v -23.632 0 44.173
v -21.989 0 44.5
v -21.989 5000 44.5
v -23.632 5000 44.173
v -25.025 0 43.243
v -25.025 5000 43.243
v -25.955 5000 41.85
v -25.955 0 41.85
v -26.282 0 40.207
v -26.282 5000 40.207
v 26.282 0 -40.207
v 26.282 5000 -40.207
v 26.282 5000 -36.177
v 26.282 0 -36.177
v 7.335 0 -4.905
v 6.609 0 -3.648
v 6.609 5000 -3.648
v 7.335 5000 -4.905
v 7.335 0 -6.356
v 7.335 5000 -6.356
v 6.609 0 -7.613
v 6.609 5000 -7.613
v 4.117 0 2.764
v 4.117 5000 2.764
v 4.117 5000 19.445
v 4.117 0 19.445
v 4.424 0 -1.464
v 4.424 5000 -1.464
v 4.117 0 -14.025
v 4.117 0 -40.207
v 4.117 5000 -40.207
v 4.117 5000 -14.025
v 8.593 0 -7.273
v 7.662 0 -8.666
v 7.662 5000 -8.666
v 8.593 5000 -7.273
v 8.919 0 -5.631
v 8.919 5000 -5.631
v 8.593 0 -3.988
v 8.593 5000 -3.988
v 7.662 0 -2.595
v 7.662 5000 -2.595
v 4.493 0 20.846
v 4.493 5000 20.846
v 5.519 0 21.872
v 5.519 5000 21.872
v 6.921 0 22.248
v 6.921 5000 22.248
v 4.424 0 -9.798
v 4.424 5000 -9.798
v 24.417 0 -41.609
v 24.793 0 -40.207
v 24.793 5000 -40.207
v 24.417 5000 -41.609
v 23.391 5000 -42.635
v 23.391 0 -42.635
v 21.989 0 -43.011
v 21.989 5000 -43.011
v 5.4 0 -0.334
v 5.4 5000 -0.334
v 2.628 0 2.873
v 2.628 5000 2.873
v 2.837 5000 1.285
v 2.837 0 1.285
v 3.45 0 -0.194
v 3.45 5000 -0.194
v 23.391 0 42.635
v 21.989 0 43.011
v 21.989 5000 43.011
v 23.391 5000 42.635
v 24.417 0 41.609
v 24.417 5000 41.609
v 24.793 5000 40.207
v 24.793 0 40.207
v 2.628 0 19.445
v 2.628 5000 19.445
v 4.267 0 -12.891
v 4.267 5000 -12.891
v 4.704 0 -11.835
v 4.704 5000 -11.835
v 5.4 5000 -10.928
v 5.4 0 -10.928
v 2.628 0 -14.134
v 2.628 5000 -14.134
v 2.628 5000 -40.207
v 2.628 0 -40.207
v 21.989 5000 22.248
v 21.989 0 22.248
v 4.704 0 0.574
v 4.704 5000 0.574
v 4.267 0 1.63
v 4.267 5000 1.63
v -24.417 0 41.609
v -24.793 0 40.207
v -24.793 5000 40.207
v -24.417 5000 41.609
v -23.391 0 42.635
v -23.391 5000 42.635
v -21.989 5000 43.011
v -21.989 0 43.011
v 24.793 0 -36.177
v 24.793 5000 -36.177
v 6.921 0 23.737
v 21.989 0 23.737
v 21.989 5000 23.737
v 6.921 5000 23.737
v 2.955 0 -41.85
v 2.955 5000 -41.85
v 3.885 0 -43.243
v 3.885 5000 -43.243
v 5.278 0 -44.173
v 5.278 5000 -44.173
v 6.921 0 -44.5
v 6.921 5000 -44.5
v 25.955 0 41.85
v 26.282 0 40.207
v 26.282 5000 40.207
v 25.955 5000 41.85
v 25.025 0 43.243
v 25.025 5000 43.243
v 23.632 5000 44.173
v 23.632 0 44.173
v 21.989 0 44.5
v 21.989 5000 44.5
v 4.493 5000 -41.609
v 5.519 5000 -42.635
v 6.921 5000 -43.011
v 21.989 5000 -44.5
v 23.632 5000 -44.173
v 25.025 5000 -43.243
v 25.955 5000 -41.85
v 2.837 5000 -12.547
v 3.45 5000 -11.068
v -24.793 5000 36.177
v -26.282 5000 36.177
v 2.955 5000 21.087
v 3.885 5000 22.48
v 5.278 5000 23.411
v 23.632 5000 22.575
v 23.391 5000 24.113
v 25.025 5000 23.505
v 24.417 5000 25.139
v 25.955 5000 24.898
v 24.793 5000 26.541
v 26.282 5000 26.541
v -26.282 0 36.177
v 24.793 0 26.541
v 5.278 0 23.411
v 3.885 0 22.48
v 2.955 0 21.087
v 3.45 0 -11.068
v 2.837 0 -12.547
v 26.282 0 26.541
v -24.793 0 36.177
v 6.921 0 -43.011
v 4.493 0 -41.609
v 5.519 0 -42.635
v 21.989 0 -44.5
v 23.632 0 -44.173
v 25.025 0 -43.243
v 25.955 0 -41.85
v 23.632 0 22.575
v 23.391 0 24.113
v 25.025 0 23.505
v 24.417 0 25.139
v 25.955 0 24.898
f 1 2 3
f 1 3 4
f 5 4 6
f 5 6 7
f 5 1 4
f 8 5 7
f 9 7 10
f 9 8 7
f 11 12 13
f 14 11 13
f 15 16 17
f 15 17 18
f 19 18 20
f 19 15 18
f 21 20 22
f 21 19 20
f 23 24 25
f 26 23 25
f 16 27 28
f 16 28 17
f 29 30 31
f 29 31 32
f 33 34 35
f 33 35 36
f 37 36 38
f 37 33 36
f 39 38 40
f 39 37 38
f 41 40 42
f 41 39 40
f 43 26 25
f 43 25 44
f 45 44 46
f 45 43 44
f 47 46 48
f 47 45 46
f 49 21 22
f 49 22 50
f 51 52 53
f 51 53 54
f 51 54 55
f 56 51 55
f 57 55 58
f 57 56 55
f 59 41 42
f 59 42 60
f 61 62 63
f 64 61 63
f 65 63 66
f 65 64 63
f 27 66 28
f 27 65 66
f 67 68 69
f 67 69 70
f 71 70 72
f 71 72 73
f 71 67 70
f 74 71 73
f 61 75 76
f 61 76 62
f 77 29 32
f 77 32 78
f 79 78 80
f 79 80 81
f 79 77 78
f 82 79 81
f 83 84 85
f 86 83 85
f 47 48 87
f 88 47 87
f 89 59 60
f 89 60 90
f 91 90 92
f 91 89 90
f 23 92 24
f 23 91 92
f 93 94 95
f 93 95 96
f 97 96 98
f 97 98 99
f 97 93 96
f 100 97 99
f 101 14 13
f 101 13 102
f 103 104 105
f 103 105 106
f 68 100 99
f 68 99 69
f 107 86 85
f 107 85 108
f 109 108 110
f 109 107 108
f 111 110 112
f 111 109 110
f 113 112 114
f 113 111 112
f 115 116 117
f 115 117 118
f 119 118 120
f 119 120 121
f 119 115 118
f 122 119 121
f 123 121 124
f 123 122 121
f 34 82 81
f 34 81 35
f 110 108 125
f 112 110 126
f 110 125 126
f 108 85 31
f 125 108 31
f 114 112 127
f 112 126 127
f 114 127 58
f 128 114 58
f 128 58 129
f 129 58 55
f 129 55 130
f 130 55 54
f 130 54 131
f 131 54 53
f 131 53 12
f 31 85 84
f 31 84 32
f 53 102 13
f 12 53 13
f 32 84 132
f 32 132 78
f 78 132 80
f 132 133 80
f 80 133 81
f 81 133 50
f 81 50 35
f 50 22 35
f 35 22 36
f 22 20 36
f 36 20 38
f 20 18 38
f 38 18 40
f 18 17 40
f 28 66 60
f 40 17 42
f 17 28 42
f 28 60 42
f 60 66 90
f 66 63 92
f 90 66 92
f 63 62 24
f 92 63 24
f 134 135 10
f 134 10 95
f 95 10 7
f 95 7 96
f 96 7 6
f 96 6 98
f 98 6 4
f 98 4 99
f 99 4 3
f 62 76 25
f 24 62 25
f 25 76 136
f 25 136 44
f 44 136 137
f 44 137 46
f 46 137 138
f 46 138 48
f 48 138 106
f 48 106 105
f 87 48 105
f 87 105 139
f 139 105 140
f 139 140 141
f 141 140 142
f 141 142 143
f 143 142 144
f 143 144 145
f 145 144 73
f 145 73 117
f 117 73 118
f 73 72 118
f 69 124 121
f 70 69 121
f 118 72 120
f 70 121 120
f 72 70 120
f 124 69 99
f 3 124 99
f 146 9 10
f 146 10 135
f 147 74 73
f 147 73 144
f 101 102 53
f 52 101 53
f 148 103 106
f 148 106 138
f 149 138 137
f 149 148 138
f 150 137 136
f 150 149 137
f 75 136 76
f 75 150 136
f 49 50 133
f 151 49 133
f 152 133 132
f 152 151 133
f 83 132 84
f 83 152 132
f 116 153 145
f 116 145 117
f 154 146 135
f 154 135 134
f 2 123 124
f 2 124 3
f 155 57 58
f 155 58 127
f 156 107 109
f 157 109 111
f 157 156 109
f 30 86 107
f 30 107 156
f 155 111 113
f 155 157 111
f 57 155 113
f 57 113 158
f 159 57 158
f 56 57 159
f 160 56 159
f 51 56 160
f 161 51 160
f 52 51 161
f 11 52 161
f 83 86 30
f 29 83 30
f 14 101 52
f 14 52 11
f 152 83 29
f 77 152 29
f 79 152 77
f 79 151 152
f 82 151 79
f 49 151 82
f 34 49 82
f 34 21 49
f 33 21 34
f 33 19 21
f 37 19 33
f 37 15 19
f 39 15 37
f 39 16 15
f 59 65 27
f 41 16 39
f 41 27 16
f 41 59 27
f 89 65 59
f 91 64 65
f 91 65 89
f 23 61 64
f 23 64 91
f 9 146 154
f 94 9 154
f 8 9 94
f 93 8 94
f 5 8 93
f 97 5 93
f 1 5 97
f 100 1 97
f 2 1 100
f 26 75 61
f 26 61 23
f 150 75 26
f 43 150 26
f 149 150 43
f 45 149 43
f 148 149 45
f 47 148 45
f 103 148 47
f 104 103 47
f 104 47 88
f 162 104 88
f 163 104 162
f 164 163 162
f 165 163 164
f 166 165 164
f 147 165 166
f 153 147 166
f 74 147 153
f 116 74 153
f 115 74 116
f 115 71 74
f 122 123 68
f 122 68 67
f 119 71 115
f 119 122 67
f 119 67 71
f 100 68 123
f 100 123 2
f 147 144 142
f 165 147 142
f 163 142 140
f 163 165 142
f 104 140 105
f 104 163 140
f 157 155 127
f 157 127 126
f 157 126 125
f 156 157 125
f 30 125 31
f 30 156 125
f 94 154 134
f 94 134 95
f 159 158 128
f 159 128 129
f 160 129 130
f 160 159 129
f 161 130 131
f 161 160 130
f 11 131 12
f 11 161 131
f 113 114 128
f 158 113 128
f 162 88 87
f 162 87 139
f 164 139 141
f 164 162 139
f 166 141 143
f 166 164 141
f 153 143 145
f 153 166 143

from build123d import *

# Parameters (mm, degrees)
F1_DEPTH = 5000


# Not quite as in the source:
# - ends of sketch curves that miss each other by under 0.0002 mm in the source are joined


with BuildPart() as f1:
    # F0 (on Front) → F1 (new body)
    with BuildSketch(Plane.XZ):
        with BuildLine():
            Line((26.2818114252, -40.2073050281), (26.2818114252, -36.177426882))
            Line((26.2818114252, -36.177426882), (24.7925087778, -36.177426882))
            Line((24.7925087778, -36.177426882), (24.7925087778, -40.2073046339))
            ThreePointArc((24.7925087778, -40.2073046339), (23.9714139143, -42.1896029892), (21.9891155591, -43.0106978526))
            Line((21.9891155591, -43.0106978526), (6.9208770086, -43.0106978526))
            ThreePointArc((6.9208770086, -43.0106978526), (4.9385786534, -42.1896029892), (4.1174837899, -40.2073046339))
            Line((4.1174837899, -40.2073046339), (4.1174837899, -30.6058300818))
            Line((4.1174837899, -30.6058300818), (4.1174837899, -14.0251837989))
            ThreePointArc((4.1174837899, -14.0251837989), (4.4509143771, -12.3489149315), (5.4004443607, -10.9278427721))
            Line((5.4004443607, -10.9278427721), (7.6621440673, -8.6661430321))
            ThreePointArc((7.6621440673, -8.6661430321), (8.9194384176, -5.6307558244), (7.662136908, -2.5953614834))
            Line((7.662136908, -2.5953614834), (5.4004444754, -0.3336690558))
            ThreePointArc((5.4004444754, -0.3336690558), (4.4509144127, 1.0874031659), (4.1174837899, 2.7636721191))
            Line((4.1174837899, 2.7636721191), (4.1174837899, 19.444672608))
            ThreePointArc((4.1174837899, 19.444672608), (4.9385786534, 21.4269709633), (6.9208770086, 22.2480658267))
            Line((6.9208770086, 22.2480658267), (21.9891155591, 22.2480658267))
            ThreePointArc((21.9891155591, 22.2480658267), (25.0245099156, 23.5053673363), (26.2818114252, 26.5407616928))
            Line((26.2818114252, 26.5407616928), (26.2818114252, 40.2073036339))
            ThreePointArc((26.2818114252, 40.2073036339), (25.0245099156, 43.2426979904), (21.9891155591, 44.4999995))
            Line((21.9891155591, 44.4999995), (-21.9891155591, 44.4999995))
            ThreePointArc((-21.9891155591, 44.4999995), (-25.0245099156, 43.2426979904), (-26.2818114252, 40.2073036339))
            Line((-26.2818114252, 40.2073036339), (-26.2818114252, 36.177425882))
            Line((-26.2818114252, 36.177425882), (-24.7925087778, 36.177425882))
            Line((-24.7925087778, 36.177425882), (-24.7925087778, 40.2073036339))
            ThreePointArc((-24.7925087778, 40.2073036339), (-23.9714139143, 42.1896019892), (-21.9891155591, 43.0106968526))
            Line((-21.9891155591, 43.0106968526), (21.9891155591, 43.0106968526))
            ThreePointArc((21.9891155591, 43.0106968526), (23.9714139143, 42.1896019892), (24.7925087778, 40.2073036339))
            Line((24.7925087778, 40.2073036339), (24.7925087778, 26.5407616928))
            ThreePointArc((24.7925087778, 26.5407616928), (23.9714139143, 24.5584633375), (21.9891155591, 23.7373684741))
            Line((21.9891155591, 23.7373684741), (6.9208770086, 23.7373684741))
            ThreePointArc((6.9208770086, 23.7373684741), (3.8854826521, 22.4800669645), (2.6281811425, 19.444672608))
            Line((2.6281811425, 19.444672608), (2.6281811425, 2.8725354557))
            ThreePointArc((2.6281811425, 2.8725354557), (3.0949839305, 0.525758642), (4.4243261563, -1.4637426783))
            Line((4.4243261563, -1.4637426783), (6.6090409069, -3.6484574844))
            ThreePointArc((6.6090409069, -3.6484574844), (7.4301357701, -5.6307558399), (6.6090409067, -7.6130541952))
            Line((6.6090409067, -7.6130541952), (4.4243263037, -9.7977687547))
            ThreePointArc((4.4243263037, -9.7977687547), (3.0949840701, -11.7872699409), (2.6281811425, -14.1340466099))
            Line((2.6281811425, -14.1340466099), (2.6281811425, -30.4969672709))
            Line((2.6281811425, -30.4969672709), (2.6281811425, -40.2073046339))
            ThreePointArc((2.6281811425, -40.2073046339), (3.8854826521, -43.2426989904), (6.9208770086, -44.5000005))
            Line((6.9208770086, -44.5000005), (21.9891155591, -44.5000005))
            ThreePointArc((21.9891155591, -44.5000005), (25.0245099156, -43.2426989904), (26.2818114252, -40.2073050281))
        make_face()
    extrude(amount=-F1_DEPTH)


solid = f1.part
